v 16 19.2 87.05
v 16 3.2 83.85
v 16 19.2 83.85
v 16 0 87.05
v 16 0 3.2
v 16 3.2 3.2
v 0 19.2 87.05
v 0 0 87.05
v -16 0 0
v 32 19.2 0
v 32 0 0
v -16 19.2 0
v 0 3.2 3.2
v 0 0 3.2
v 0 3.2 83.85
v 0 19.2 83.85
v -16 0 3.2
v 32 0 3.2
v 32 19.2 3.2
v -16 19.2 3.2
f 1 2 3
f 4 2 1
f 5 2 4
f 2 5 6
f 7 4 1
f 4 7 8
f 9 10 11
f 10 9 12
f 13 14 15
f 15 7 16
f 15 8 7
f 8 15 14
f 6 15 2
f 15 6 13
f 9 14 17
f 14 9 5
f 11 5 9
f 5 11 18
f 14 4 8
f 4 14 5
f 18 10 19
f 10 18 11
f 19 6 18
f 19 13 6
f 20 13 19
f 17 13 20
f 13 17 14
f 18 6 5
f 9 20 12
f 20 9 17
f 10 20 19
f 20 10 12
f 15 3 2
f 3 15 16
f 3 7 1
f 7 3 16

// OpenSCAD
//Spaltmaß, max. Spalt 3.5 mm
b=3.2;
//Höhe Messlatte
h=95.25-5-b;//80.25 (Schiebler) 95.25 Schiebler aber das hintere Teil => passt genau auf Unterkante (sind auch 5mm wie die Schieblerdifferenz) => 5mm niedriger, und da wir dann Oberkante brauchen -b noch

//Abstand nach hinten bis Gewindestange, mind. 16 nach hinten
t=16; //war 5 im Orig, aber einfach weil wir Symetrie lieben b*2

cube([t,b,h]);

translate([-t,0,0])
cube([t*3,t+b,b]);

translate([0,0,h-b])
cube([t,t+b,b]);
